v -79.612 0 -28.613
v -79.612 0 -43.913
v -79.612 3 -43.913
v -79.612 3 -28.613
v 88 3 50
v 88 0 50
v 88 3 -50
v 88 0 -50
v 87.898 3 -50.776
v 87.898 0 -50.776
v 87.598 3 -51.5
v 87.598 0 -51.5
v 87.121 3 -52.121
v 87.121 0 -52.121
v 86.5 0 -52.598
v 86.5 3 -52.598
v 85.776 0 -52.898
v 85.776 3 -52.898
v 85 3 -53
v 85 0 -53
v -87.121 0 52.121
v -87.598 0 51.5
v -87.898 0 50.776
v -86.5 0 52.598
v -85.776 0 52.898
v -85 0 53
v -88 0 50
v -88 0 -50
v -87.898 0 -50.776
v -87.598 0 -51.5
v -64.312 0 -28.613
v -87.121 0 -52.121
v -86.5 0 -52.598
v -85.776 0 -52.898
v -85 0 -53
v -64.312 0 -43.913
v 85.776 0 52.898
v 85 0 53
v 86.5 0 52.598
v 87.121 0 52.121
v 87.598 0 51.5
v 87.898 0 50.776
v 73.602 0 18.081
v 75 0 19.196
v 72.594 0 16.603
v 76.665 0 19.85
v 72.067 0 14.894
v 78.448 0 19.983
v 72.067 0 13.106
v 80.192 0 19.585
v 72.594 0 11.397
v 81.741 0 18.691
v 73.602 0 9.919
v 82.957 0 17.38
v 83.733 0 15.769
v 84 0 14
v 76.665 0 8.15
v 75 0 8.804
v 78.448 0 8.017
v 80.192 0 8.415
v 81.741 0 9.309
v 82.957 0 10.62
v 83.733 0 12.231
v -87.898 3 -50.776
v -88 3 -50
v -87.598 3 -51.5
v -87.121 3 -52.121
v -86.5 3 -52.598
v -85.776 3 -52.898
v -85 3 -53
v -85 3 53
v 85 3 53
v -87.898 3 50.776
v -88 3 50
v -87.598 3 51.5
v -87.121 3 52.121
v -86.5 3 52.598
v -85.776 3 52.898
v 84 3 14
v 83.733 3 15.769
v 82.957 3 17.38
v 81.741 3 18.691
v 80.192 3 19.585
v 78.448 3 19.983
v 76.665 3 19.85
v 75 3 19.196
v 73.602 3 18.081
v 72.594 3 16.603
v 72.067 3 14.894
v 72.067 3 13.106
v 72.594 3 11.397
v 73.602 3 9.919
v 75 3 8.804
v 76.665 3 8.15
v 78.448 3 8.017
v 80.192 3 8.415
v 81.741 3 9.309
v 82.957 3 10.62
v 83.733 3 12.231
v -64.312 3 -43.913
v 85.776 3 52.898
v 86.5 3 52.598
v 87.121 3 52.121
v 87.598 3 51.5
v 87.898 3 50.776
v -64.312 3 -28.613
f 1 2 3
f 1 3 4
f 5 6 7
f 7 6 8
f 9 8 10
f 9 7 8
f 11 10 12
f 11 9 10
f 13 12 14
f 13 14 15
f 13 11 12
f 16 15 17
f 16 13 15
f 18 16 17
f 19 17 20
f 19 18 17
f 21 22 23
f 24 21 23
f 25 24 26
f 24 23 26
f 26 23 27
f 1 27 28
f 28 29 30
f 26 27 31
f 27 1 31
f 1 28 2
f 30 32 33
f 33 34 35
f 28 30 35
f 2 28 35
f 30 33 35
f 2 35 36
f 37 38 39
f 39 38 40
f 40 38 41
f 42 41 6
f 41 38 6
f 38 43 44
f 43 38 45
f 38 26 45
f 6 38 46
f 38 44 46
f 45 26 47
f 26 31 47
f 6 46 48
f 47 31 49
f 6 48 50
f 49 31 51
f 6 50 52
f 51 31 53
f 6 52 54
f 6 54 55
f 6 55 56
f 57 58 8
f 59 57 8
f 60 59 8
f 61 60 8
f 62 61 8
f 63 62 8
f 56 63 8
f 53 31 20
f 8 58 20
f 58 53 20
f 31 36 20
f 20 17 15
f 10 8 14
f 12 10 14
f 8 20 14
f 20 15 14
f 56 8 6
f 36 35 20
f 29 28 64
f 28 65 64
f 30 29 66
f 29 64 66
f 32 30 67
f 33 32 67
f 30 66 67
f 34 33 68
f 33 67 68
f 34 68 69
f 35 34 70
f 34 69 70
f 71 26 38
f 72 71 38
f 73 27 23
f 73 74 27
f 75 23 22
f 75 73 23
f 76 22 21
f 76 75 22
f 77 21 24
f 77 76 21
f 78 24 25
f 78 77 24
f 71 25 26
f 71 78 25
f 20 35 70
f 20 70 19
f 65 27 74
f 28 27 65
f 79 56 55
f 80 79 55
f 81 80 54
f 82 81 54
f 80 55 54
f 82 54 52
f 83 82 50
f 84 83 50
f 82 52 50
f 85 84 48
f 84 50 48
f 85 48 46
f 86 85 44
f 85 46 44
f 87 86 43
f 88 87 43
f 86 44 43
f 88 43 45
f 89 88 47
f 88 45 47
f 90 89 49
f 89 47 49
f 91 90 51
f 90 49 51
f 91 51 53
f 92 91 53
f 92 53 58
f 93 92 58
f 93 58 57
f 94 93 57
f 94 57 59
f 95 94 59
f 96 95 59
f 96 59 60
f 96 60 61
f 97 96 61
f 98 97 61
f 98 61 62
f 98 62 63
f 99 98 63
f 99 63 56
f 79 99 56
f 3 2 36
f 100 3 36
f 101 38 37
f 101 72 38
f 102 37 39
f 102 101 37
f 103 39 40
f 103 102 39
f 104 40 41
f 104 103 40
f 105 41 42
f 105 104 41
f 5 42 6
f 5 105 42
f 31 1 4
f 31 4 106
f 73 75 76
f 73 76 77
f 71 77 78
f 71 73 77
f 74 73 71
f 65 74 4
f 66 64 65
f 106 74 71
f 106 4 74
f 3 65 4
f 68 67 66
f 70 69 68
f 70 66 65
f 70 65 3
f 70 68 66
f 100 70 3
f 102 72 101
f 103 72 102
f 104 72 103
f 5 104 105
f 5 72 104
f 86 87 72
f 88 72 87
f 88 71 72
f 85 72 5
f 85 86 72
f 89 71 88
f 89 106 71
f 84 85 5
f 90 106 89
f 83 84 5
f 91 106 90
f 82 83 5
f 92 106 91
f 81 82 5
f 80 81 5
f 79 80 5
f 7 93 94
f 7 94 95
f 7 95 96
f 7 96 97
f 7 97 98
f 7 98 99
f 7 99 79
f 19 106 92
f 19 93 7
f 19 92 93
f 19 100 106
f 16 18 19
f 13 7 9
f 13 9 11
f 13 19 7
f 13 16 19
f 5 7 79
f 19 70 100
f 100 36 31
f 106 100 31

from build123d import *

# Parameters (mm, degrees)
ESQUISSE1_W             = 176
ESQUISSE1_H             = 106
BOSS_EXTRU_1_DEPTH      = 3
CONG_1_R                = 3
ESQUISSE3_R             = 6
ENL_V_MAT_EXTRU_2_DEPTH = 10
ESQUISSE4_W             = 15.3
ESQUISSE4_H             = 15.3
ENL_V_MAT_EXTRU_3_DEPTH = 10


with BuildPart() as part:
    # Esquisse1 → Boss.-Extru.1 (new body)
    with BuildSketch(Plane(origin=(0, 0, 0), x_dir=(1, 0, 0), z_dir=(0, 1, 0))):
        Rectangle(ESQUISSE1_W, ESQUISSE1_H)
    extrude(amount=BOSS_EXTRU_1_DEPTH)

    # Congé1
    cong_1_edges = [part.edges().sort_by_distance(p)[0] for p in [
        (88, 1.5, 53),
        (-88, 1.5, 53),
        (-88, 1.5, -53),
        (88, 1.5, -53),
    ]]
    fillet(cong_1_edges, radius=CONG_1_R)

    # Esquisse3 → Enlèv. mat.-Extru.2 (cut)
    with BuildSketch(Plane.XZ):
        with Locations((78, 14)):
            Circle(ESQUISSE3_R)
    extrude(amount=-ENL_V_MAT_EXTRU_2_DEPTH, mode=Mode.SUBTRACT)

    # Esquisse4 → Enlèv. mat.-Extru.3 (cut)
    with BuildSketch(Plane.XZ):
        with Locations((-71.961639113, -36.263401643)):
            Rectangle(ESQUISSE4_W, ESQUISSE4_H)
    extrude(amount=-ENL_V_MAT_EXTRU_3_DEPTH, mode=Mode.SUBTRACT)


solid = part.part
